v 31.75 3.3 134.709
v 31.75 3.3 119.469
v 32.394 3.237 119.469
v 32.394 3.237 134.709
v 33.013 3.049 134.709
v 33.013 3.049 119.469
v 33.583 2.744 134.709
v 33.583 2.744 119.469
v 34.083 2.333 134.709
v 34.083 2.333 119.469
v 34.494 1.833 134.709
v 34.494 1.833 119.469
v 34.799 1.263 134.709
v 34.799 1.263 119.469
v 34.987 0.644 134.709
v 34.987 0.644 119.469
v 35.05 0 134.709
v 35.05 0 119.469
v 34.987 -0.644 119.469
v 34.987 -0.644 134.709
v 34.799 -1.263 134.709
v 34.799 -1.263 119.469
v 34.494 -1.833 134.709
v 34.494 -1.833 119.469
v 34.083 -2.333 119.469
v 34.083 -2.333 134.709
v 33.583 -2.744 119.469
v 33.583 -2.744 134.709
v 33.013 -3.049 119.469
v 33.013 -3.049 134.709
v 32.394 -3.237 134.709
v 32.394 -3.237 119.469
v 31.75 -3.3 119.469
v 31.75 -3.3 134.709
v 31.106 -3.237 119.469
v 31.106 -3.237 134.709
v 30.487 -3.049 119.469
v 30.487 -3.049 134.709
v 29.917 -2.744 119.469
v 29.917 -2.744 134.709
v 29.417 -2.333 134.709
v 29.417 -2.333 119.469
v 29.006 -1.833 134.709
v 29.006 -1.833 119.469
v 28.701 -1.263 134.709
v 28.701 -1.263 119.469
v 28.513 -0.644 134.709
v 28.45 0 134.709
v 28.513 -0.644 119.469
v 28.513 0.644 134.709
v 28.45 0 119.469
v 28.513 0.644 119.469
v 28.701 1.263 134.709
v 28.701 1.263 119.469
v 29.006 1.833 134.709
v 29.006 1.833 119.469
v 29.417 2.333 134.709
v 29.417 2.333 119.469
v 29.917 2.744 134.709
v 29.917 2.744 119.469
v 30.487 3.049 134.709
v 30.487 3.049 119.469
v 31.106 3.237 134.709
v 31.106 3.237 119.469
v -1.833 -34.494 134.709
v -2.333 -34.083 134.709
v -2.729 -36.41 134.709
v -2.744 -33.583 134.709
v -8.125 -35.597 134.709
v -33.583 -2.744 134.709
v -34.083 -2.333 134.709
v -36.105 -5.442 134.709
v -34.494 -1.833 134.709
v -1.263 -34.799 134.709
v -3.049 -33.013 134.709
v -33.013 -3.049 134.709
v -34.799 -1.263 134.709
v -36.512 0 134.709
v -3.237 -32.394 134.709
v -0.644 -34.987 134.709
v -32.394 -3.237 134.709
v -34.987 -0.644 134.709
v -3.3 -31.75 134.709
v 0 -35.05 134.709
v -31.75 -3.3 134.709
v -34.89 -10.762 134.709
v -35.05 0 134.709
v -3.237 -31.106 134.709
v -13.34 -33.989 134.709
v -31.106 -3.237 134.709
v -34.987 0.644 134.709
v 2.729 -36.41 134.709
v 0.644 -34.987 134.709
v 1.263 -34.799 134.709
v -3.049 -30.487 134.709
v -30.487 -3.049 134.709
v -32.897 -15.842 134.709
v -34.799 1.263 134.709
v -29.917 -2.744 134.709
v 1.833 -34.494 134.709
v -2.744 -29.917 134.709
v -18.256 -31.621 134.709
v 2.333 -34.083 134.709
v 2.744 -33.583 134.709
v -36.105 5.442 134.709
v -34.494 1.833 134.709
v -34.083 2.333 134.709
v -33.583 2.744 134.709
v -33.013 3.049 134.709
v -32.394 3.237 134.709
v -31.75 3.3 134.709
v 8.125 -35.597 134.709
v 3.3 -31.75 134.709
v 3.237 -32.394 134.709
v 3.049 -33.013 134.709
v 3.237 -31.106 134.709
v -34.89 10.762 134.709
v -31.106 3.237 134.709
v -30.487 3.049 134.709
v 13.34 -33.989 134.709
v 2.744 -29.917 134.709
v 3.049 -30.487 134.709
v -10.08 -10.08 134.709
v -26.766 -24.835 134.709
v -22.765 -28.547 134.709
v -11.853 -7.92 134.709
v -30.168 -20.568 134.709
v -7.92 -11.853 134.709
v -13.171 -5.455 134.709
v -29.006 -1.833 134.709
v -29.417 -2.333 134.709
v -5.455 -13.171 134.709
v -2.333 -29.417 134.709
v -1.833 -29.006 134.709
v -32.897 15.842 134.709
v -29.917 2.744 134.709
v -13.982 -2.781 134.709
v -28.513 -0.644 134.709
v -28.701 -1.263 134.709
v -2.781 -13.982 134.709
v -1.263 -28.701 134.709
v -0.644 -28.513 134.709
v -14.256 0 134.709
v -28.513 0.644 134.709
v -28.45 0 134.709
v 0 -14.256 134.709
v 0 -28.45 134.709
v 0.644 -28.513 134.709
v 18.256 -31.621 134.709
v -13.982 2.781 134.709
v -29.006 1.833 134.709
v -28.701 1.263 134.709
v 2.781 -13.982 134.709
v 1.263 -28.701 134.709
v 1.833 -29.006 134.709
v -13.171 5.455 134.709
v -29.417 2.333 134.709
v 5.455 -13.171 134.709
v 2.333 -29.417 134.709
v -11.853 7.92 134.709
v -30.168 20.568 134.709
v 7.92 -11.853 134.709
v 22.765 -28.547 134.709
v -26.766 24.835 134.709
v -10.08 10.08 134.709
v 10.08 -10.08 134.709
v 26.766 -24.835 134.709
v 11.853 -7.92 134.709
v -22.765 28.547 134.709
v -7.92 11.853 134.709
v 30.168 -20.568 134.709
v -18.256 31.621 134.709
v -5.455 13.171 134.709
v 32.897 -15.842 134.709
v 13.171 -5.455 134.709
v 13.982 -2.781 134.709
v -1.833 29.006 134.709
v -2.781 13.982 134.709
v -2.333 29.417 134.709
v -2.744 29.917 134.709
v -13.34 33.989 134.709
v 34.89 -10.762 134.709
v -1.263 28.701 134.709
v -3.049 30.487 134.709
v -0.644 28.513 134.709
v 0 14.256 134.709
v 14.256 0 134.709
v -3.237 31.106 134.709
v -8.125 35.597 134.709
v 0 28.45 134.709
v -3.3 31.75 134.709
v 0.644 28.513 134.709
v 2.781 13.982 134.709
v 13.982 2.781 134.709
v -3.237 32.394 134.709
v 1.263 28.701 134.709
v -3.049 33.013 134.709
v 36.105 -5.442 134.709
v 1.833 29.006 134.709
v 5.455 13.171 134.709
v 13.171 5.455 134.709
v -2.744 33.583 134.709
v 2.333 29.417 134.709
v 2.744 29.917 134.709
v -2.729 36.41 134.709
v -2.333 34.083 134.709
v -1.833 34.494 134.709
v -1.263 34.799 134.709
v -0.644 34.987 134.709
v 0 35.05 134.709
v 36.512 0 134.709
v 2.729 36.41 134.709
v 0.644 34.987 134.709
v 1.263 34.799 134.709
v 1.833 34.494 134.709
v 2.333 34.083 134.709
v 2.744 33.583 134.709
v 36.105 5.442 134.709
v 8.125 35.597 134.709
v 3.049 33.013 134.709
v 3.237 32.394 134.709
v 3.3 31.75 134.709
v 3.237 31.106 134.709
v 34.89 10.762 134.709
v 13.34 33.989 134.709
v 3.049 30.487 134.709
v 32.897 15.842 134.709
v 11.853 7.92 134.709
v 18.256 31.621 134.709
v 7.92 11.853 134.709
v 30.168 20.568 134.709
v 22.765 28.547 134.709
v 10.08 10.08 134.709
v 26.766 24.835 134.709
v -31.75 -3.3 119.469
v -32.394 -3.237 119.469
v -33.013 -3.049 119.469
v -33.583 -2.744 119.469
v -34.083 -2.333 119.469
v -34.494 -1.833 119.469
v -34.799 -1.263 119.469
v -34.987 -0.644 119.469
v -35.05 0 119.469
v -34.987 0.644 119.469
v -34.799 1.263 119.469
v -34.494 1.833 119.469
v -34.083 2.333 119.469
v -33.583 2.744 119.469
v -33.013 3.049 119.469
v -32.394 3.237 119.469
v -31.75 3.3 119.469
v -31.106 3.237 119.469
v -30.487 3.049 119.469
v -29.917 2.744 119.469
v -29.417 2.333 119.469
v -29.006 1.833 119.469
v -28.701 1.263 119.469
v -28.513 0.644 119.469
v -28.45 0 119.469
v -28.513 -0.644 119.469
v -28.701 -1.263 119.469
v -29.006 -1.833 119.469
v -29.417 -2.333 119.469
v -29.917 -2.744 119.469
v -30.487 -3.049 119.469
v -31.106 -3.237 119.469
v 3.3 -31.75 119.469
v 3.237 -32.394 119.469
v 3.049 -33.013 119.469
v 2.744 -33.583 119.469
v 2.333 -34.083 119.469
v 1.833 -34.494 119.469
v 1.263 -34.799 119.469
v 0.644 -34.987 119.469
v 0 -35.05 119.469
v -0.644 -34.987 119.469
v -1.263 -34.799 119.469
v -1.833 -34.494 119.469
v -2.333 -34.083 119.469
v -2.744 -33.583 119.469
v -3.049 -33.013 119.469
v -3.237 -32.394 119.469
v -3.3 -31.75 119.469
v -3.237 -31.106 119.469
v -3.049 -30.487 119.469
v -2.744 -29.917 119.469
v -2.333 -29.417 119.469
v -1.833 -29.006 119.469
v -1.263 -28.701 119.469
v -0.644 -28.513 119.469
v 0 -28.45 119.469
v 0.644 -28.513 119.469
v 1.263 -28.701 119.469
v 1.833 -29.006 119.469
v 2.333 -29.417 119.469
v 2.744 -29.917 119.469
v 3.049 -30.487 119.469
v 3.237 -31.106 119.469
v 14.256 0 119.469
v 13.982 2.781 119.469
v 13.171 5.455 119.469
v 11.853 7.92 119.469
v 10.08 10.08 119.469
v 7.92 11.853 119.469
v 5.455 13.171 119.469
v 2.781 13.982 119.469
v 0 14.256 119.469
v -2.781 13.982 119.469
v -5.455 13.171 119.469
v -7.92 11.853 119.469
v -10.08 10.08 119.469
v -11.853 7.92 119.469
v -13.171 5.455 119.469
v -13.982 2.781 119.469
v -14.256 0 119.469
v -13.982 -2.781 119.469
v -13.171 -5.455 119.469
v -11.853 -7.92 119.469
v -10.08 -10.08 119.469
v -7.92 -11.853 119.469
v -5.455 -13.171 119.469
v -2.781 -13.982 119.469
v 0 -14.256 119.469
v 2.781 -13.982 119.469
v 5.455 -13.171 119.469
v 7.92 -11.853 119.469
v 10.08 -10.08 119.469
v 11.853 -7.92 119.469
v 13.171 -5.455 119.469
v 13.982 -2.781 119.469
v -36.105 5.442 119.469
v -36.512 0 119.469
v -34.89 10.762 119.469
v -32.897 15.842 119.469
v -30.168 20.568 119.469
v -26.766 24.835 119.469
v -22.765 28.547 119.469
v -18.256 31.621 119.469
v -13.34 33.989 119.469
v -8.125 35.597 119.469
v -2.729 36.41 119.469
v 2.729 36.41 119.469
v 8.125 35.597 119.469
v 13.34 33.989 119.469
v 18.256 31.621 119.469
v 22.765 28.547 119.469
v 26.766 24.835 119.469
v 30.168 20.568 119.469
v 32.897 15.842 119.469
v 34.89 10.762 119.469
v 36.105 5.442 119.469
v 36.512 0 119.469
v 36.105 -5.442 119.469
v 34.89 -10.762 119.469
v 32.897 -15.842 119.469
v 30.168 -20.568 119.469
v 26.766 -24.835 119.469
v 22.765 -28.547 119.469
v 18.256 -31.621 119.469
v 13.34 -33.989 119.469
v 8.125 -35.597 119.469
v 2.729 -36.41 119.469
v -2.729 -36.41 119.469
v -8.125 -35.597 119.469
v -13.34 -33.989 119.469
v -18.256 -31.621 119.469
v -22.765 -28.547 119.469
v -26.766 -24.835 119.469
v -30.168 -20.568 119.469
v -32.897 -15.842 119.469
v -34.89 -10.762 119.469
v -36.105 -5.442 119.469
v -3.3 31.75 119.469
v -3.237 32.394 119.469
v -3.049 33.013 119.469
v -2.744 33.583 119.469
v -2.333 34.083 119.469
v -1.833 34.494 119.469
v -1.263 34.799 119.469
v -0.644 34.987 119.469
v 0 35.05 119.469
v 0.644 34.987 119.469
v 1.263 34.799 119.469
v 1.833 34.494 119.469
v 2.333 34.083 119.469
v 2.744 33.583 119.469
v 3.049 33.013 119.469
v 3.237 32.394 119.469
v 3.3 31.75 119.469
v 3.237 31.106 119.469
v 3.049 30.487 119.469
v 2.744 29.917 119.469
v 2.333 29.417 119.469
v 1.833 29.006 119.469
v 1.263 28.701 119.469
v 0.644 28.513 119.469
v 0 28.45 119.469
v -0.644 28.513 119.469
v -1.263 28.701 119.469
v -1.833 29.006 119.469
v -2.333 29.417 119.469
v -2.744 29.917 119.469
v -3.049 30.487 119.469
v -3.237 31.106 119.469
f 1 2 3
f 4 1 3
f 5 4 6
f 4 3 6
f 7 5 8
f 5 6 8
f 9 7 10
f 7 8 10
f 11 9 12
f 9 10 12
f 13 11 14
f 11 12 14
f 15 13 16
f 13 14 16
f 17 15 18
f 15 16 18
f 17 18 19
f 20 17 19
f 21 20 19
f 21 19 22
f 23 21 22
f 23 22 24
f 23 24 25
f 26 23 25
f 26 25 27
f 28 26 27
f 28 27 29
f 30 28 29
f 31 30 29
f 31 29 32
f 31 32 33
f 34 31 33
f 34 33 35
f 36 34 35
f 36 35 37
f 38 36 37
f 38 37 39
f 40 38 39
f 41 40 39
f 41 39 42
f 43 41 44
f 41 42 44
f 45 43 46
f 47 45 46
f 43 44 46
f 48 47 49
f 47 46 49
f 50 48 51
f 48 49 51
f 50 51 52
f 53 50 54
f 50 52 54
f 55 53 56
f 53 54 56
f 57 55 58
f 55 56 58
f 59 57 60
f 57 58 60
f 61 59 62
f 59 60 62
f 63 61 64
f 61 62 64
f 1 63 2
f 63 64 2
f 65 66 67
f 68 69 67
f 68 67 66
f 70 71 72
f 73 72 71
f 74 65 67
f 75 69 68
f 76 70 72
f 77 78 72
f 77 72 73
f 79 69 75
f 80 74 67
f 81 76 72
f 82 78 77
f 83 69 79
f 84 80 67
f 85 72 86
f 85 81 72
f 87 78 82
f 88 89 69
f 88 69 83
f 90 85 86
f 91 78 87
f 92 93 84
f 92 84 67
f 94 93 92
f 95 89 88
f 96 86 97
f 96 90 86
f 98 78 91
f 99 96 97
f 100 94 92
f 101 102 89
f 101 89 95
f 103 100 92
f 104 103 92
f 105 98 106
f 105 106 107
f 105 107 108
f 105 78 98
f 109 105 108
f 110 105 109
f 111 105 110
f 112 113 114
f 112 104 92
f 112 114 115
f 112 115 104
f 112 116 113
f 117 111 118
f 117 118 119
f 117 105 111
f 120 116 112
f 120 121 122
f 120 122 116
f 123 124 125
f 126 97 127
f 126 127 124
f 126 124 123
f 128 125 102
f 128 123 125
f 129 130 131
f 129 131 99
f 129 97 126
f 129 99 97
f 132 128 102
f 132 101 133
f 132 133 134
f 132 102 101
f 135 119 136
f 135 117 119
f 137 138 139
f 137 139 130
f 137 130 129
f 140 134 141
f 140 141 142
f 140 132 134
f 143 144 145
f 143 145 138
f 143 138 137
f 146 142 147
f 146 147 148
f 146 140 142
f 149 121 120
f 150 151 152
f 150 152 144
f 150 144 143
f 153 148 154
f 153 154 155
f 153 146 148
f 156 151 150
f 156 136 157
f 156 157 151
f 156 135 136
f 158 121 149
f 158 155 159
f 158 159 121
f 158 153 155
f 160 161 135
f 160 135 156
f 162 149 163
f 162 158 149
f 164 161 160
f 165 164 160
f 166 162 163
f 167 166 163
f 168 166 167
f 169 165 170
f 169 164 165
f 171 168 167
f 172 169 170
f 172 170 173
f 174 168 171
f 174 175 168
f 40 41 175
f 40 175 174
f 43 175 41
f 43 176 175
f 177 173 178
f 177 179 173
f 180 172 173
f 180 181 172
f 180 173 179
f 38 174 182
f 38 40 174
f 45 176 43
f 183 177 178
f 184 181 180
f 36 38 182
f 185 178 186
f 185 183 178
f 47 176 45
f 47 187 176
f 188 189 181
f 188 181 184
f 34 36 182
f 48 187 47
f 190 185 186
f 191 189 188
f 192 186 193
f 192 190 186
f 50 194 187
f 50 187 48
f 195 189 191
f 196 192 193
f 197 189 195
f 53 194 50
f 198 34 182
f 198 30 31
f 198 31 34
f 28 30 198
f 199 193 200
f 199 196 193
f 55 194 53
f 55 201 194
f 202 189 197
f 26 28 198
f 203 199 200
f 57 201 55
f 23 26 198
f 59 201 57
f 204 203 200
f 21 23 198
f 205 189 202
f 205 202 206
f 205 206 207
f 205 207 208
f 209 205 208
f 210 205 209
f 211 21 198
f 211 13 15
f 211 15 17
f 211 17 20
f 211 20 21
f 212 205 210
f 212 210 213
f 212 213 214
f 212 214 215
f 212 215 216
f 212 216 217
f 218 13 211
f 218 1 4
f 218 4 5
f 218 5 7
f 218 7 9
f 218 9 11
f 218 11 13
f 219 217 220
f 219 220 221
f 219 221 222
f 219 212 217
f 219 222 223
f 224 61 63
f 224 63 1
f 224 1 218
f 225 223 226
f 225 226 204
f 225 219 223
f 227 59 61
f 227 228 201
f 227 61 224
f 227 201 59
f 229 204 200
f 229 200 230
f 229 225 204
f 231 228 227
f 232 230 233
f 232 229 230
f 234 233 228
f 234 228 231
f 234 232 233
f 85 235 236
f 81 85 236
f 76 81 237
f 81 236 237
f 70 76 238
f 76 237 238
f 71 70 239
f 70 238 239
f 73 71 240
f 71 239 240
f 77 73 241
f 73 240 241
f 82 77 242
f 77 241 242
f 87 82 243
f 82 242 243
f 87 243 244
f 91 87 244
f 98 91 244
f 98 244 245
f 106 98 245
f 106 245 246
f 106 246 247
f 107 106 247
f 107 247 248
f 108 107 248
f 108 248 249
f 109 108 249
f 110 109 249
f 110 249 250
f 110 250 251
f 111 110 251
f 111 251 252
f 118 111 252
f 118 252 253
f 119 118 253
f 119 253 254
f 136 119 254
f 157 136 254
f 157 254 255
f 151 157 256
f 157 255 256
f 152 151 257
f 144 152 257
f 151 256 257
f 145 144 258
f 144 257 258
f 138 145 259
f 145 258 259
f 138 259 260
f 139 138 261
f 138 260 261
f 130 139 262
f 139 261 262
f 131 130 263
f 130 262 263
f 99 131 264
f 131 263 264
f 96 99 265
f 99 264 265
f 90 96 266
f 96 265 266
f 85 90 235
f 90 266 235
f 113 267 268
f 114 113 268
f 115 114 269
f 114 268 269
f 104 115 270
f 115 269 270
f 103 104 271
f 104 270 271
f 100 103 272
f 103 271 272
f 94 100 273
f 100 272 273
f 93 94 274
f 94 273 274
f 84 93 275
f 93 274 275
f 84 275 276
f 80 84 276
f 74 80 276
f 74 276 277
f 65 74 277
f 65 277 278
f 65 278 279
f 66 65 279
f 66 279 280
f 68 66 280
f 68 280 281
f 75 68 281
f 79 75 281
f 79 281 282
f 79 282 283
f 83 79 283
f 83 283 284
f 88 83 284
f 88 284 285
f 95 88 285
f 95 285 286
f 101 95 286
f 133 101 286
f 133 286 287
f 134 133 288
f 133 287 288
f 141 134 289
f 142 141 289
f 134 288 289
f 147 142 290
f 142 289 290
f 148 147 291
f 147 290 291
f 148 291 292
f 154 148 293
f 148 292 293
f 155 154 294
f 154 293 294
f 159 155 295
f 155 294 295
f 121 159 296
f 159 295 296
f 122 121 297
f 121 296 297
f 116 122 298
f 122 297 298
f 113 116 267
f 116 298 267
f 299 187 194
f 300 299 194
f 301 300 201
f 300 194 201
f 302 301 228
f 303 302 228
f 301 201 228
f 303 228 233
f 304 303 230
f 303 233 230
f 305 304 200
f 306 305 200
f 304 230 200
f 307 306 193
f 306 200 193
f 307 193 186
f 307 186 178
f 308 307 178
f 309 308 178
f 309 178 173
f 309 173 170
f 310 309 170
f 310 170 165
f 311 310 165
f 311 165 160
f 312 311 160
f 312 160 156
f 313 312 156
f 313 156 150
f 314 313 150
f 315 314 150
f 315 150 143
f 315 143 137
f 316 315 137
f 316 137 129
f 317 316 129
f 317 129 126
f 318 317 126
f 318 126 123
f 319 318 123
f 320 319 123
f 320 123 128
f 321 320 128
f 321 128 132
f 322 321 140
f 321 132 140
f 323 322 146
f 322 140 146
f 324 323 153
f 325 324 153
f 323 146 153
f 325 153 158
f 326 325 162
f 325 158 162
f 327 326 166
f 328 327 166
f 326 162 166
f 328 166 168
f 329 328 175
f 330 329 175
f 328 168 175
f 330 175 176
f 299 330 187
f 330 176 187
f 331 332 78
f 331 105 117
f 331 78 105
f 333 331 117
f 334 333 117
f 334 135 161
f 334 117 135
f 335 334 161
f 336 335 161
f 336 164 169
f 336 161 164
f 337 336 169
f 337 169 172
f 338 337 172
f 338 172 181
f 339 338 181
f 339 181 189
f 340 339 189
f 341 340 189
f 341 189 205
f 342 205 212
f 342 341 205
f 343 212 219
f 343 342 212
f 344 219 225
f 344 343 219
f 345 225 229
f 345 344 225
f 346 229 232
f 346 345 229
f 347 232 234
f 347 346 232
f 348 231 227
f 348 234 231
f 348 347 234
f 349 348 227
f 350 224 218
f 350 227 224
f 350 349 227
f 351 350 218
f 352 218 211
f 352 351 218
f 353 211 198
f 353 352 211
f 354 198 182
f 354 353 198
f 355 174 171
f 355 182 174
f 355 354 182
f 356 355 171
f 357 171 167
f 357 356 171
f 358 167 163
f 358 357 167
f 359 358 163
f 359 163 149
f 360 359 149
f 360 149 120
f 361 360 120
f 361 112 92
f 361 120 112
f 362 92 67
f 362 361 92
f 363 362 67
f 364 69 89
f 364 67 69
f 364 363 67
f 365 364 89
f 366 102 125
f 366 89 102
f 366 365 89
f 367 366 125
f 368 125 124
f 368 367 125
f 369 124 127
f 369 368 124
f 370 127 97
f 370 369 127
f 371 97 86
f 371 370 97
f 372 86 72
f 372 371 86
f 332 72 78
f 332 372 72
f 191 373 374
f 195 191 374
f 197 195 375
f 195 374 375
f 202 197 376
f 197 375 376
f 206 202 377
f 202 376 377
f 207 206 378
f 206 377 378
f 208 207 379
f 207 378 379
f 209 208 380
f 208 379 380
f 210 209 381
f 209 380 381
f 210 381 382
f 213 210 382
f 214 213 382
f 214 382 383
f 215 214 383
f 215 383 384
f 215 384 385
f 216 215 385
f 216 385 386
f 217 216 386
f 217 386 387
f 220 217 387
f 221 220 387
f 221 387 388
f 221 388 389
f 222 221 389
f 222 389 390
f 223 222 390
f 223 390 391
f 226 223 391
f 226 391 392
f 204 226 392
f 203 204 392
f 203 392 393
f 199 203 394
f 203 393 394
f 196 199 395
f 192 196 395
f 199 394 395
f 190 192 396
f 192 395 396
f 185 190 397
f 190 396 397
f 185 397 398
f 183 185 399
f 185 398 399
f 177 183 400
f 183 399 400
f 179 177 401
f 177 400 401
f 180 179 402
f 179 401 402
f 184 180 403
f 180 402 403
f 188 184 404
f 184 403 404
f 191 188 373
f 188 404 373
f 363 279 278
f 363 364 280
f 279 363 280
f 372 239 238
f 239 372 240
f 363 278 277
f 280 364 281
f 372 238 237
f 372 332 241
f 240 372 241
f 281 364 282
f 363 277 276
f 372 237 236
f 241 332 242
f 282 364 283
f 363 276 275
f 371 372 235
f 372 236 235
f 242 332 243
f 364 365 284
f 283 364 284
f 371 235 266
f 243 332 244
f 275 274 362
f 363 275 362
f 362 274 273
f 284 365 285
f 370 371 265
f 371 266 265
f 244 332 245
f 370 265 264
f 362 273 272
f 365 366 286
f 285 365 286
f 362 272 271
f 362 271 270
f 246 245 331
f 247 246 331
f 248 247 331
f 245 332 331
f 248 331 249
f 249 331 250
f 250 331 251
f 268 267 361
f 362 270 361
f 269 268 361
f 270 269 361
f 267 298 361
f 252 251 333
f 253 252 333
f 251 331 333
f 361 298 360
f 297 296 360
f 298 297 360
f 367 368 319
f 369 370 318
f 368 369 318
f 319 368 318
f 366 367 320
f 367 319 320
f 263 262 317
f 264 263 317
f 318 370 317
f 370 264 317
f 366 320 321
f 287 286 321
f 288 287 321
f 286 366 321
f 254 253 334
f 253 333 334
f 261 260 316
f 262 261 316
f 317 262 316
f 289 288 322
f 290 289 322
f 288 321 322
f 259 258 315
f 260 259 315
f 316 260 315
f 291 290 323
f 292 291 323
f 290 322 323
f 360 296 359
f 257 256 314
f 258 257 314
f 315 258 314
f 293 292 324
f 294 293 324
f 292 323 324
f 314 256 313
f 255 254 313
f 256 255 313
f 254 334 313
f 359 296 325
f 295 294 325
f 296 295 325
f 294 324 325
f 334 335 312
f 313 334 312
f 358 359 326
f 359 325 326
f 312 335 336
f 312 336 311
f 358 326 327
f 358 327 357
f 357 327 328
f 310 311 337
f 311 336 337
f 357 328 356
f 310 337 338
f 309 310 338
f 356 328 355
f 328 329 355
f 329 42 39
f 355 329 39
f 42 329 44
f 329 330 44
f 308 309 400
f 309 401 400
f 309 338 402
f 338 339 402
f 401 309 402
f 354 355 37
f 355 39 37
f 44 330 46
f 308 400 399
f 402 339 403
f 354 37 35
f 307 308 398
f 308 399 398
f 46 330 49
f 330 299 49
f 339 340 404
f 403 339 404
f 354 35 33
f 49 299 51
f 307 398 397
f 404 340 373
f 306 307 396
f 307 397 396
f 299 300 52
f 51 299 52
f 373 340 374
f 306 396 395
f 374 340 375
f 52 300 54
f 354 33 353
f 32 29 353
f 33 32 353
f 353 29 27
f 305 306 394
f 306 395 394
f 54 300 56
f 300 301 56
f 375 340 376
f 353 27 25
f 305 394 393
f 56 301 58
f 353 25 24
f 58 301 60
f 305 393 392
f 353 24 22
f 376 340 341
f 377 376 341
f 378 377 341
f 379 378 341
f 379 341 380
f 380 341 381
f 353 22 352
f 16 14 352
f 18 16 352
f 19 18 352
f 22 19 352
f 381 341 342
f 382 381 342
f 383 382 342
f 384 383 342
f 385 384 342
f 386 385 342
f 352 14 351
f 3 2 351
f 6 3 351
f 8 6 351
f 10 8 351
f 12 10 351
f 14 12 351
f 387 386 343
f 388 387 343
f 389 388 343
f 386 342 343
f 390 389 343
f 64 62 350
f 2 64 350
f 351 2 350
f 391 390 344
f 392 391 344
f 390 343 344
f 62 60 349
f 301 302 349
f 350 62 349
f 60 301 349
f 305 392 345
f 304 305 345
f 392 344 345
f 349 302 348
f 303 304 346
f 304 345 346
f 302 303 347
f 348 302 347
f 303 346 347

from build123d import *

# Parameters (mm, degrees)
SKETCH1_W            = 15.24
SKETCH1_H            = 26.9875
SKETCH5_R            = 14.25575
SEAL_SEAT_DEPTH      = 54.838489136
M6_CLEARANCE_HOLE1_D = 6.6
CIRPATTERN1_COUNT    = 4


with BuildPart() as part:
    # Sketch1 → Main_body (revolve)
    with BuildSketch(Plane(origin=(0, 0, 0), x_dir=(0, 0, -1), z_dir=(1, 0, 0)), mode=Mode.PRIVATE) as main_body_sk:
        with Locations((-127.089000076, -23.01875)):
            Rectangle(SKETCH1_W, SKETCH1_H)
        with Locations((-127.089000076, 23.01875)):
            Rectangle(SKETCH1_W, SKETCH1_H)
    revolve(main_body_sk.sketch.rotate(Axis((0, 0, 1000), (0, 0, -1)), 270), axis=Axis((0, 0, 1000), (0, 0, -1)))

    # Sketch5 → seal_seat (cut, through all)
    with BuildSketch(Plane.XY.offset(134.709000076)):
        Circle(SKETCH5_R)
    extrude(amount=-SEAL_SEAT_DEPTH, mode=Mode.SUBTRACT)

    # M6 Clearance Hole1 (through all)
    with Locations(Plane.XY.offset(134.709000076)):
        with Locations((0, 31.75)):
            m6_clearance_hole1 = Hole(M6_CLEARANCE_HOLE1_D / 2)

    # CirPattern1: M6 Clearance Hole1 ×4 about axis
    cirpattern1_axis = Axis((0, 0, 0), (0, 0, 1))
    for i in range(1, CIRPATTERN1_COUNT):
        add(m6_clearance_hole1.rotate(cirpattern1_axis, i * 360 / CIRPATTERN1_COUNT), mode=Mode.SUBTRACT)


solid = part.part
